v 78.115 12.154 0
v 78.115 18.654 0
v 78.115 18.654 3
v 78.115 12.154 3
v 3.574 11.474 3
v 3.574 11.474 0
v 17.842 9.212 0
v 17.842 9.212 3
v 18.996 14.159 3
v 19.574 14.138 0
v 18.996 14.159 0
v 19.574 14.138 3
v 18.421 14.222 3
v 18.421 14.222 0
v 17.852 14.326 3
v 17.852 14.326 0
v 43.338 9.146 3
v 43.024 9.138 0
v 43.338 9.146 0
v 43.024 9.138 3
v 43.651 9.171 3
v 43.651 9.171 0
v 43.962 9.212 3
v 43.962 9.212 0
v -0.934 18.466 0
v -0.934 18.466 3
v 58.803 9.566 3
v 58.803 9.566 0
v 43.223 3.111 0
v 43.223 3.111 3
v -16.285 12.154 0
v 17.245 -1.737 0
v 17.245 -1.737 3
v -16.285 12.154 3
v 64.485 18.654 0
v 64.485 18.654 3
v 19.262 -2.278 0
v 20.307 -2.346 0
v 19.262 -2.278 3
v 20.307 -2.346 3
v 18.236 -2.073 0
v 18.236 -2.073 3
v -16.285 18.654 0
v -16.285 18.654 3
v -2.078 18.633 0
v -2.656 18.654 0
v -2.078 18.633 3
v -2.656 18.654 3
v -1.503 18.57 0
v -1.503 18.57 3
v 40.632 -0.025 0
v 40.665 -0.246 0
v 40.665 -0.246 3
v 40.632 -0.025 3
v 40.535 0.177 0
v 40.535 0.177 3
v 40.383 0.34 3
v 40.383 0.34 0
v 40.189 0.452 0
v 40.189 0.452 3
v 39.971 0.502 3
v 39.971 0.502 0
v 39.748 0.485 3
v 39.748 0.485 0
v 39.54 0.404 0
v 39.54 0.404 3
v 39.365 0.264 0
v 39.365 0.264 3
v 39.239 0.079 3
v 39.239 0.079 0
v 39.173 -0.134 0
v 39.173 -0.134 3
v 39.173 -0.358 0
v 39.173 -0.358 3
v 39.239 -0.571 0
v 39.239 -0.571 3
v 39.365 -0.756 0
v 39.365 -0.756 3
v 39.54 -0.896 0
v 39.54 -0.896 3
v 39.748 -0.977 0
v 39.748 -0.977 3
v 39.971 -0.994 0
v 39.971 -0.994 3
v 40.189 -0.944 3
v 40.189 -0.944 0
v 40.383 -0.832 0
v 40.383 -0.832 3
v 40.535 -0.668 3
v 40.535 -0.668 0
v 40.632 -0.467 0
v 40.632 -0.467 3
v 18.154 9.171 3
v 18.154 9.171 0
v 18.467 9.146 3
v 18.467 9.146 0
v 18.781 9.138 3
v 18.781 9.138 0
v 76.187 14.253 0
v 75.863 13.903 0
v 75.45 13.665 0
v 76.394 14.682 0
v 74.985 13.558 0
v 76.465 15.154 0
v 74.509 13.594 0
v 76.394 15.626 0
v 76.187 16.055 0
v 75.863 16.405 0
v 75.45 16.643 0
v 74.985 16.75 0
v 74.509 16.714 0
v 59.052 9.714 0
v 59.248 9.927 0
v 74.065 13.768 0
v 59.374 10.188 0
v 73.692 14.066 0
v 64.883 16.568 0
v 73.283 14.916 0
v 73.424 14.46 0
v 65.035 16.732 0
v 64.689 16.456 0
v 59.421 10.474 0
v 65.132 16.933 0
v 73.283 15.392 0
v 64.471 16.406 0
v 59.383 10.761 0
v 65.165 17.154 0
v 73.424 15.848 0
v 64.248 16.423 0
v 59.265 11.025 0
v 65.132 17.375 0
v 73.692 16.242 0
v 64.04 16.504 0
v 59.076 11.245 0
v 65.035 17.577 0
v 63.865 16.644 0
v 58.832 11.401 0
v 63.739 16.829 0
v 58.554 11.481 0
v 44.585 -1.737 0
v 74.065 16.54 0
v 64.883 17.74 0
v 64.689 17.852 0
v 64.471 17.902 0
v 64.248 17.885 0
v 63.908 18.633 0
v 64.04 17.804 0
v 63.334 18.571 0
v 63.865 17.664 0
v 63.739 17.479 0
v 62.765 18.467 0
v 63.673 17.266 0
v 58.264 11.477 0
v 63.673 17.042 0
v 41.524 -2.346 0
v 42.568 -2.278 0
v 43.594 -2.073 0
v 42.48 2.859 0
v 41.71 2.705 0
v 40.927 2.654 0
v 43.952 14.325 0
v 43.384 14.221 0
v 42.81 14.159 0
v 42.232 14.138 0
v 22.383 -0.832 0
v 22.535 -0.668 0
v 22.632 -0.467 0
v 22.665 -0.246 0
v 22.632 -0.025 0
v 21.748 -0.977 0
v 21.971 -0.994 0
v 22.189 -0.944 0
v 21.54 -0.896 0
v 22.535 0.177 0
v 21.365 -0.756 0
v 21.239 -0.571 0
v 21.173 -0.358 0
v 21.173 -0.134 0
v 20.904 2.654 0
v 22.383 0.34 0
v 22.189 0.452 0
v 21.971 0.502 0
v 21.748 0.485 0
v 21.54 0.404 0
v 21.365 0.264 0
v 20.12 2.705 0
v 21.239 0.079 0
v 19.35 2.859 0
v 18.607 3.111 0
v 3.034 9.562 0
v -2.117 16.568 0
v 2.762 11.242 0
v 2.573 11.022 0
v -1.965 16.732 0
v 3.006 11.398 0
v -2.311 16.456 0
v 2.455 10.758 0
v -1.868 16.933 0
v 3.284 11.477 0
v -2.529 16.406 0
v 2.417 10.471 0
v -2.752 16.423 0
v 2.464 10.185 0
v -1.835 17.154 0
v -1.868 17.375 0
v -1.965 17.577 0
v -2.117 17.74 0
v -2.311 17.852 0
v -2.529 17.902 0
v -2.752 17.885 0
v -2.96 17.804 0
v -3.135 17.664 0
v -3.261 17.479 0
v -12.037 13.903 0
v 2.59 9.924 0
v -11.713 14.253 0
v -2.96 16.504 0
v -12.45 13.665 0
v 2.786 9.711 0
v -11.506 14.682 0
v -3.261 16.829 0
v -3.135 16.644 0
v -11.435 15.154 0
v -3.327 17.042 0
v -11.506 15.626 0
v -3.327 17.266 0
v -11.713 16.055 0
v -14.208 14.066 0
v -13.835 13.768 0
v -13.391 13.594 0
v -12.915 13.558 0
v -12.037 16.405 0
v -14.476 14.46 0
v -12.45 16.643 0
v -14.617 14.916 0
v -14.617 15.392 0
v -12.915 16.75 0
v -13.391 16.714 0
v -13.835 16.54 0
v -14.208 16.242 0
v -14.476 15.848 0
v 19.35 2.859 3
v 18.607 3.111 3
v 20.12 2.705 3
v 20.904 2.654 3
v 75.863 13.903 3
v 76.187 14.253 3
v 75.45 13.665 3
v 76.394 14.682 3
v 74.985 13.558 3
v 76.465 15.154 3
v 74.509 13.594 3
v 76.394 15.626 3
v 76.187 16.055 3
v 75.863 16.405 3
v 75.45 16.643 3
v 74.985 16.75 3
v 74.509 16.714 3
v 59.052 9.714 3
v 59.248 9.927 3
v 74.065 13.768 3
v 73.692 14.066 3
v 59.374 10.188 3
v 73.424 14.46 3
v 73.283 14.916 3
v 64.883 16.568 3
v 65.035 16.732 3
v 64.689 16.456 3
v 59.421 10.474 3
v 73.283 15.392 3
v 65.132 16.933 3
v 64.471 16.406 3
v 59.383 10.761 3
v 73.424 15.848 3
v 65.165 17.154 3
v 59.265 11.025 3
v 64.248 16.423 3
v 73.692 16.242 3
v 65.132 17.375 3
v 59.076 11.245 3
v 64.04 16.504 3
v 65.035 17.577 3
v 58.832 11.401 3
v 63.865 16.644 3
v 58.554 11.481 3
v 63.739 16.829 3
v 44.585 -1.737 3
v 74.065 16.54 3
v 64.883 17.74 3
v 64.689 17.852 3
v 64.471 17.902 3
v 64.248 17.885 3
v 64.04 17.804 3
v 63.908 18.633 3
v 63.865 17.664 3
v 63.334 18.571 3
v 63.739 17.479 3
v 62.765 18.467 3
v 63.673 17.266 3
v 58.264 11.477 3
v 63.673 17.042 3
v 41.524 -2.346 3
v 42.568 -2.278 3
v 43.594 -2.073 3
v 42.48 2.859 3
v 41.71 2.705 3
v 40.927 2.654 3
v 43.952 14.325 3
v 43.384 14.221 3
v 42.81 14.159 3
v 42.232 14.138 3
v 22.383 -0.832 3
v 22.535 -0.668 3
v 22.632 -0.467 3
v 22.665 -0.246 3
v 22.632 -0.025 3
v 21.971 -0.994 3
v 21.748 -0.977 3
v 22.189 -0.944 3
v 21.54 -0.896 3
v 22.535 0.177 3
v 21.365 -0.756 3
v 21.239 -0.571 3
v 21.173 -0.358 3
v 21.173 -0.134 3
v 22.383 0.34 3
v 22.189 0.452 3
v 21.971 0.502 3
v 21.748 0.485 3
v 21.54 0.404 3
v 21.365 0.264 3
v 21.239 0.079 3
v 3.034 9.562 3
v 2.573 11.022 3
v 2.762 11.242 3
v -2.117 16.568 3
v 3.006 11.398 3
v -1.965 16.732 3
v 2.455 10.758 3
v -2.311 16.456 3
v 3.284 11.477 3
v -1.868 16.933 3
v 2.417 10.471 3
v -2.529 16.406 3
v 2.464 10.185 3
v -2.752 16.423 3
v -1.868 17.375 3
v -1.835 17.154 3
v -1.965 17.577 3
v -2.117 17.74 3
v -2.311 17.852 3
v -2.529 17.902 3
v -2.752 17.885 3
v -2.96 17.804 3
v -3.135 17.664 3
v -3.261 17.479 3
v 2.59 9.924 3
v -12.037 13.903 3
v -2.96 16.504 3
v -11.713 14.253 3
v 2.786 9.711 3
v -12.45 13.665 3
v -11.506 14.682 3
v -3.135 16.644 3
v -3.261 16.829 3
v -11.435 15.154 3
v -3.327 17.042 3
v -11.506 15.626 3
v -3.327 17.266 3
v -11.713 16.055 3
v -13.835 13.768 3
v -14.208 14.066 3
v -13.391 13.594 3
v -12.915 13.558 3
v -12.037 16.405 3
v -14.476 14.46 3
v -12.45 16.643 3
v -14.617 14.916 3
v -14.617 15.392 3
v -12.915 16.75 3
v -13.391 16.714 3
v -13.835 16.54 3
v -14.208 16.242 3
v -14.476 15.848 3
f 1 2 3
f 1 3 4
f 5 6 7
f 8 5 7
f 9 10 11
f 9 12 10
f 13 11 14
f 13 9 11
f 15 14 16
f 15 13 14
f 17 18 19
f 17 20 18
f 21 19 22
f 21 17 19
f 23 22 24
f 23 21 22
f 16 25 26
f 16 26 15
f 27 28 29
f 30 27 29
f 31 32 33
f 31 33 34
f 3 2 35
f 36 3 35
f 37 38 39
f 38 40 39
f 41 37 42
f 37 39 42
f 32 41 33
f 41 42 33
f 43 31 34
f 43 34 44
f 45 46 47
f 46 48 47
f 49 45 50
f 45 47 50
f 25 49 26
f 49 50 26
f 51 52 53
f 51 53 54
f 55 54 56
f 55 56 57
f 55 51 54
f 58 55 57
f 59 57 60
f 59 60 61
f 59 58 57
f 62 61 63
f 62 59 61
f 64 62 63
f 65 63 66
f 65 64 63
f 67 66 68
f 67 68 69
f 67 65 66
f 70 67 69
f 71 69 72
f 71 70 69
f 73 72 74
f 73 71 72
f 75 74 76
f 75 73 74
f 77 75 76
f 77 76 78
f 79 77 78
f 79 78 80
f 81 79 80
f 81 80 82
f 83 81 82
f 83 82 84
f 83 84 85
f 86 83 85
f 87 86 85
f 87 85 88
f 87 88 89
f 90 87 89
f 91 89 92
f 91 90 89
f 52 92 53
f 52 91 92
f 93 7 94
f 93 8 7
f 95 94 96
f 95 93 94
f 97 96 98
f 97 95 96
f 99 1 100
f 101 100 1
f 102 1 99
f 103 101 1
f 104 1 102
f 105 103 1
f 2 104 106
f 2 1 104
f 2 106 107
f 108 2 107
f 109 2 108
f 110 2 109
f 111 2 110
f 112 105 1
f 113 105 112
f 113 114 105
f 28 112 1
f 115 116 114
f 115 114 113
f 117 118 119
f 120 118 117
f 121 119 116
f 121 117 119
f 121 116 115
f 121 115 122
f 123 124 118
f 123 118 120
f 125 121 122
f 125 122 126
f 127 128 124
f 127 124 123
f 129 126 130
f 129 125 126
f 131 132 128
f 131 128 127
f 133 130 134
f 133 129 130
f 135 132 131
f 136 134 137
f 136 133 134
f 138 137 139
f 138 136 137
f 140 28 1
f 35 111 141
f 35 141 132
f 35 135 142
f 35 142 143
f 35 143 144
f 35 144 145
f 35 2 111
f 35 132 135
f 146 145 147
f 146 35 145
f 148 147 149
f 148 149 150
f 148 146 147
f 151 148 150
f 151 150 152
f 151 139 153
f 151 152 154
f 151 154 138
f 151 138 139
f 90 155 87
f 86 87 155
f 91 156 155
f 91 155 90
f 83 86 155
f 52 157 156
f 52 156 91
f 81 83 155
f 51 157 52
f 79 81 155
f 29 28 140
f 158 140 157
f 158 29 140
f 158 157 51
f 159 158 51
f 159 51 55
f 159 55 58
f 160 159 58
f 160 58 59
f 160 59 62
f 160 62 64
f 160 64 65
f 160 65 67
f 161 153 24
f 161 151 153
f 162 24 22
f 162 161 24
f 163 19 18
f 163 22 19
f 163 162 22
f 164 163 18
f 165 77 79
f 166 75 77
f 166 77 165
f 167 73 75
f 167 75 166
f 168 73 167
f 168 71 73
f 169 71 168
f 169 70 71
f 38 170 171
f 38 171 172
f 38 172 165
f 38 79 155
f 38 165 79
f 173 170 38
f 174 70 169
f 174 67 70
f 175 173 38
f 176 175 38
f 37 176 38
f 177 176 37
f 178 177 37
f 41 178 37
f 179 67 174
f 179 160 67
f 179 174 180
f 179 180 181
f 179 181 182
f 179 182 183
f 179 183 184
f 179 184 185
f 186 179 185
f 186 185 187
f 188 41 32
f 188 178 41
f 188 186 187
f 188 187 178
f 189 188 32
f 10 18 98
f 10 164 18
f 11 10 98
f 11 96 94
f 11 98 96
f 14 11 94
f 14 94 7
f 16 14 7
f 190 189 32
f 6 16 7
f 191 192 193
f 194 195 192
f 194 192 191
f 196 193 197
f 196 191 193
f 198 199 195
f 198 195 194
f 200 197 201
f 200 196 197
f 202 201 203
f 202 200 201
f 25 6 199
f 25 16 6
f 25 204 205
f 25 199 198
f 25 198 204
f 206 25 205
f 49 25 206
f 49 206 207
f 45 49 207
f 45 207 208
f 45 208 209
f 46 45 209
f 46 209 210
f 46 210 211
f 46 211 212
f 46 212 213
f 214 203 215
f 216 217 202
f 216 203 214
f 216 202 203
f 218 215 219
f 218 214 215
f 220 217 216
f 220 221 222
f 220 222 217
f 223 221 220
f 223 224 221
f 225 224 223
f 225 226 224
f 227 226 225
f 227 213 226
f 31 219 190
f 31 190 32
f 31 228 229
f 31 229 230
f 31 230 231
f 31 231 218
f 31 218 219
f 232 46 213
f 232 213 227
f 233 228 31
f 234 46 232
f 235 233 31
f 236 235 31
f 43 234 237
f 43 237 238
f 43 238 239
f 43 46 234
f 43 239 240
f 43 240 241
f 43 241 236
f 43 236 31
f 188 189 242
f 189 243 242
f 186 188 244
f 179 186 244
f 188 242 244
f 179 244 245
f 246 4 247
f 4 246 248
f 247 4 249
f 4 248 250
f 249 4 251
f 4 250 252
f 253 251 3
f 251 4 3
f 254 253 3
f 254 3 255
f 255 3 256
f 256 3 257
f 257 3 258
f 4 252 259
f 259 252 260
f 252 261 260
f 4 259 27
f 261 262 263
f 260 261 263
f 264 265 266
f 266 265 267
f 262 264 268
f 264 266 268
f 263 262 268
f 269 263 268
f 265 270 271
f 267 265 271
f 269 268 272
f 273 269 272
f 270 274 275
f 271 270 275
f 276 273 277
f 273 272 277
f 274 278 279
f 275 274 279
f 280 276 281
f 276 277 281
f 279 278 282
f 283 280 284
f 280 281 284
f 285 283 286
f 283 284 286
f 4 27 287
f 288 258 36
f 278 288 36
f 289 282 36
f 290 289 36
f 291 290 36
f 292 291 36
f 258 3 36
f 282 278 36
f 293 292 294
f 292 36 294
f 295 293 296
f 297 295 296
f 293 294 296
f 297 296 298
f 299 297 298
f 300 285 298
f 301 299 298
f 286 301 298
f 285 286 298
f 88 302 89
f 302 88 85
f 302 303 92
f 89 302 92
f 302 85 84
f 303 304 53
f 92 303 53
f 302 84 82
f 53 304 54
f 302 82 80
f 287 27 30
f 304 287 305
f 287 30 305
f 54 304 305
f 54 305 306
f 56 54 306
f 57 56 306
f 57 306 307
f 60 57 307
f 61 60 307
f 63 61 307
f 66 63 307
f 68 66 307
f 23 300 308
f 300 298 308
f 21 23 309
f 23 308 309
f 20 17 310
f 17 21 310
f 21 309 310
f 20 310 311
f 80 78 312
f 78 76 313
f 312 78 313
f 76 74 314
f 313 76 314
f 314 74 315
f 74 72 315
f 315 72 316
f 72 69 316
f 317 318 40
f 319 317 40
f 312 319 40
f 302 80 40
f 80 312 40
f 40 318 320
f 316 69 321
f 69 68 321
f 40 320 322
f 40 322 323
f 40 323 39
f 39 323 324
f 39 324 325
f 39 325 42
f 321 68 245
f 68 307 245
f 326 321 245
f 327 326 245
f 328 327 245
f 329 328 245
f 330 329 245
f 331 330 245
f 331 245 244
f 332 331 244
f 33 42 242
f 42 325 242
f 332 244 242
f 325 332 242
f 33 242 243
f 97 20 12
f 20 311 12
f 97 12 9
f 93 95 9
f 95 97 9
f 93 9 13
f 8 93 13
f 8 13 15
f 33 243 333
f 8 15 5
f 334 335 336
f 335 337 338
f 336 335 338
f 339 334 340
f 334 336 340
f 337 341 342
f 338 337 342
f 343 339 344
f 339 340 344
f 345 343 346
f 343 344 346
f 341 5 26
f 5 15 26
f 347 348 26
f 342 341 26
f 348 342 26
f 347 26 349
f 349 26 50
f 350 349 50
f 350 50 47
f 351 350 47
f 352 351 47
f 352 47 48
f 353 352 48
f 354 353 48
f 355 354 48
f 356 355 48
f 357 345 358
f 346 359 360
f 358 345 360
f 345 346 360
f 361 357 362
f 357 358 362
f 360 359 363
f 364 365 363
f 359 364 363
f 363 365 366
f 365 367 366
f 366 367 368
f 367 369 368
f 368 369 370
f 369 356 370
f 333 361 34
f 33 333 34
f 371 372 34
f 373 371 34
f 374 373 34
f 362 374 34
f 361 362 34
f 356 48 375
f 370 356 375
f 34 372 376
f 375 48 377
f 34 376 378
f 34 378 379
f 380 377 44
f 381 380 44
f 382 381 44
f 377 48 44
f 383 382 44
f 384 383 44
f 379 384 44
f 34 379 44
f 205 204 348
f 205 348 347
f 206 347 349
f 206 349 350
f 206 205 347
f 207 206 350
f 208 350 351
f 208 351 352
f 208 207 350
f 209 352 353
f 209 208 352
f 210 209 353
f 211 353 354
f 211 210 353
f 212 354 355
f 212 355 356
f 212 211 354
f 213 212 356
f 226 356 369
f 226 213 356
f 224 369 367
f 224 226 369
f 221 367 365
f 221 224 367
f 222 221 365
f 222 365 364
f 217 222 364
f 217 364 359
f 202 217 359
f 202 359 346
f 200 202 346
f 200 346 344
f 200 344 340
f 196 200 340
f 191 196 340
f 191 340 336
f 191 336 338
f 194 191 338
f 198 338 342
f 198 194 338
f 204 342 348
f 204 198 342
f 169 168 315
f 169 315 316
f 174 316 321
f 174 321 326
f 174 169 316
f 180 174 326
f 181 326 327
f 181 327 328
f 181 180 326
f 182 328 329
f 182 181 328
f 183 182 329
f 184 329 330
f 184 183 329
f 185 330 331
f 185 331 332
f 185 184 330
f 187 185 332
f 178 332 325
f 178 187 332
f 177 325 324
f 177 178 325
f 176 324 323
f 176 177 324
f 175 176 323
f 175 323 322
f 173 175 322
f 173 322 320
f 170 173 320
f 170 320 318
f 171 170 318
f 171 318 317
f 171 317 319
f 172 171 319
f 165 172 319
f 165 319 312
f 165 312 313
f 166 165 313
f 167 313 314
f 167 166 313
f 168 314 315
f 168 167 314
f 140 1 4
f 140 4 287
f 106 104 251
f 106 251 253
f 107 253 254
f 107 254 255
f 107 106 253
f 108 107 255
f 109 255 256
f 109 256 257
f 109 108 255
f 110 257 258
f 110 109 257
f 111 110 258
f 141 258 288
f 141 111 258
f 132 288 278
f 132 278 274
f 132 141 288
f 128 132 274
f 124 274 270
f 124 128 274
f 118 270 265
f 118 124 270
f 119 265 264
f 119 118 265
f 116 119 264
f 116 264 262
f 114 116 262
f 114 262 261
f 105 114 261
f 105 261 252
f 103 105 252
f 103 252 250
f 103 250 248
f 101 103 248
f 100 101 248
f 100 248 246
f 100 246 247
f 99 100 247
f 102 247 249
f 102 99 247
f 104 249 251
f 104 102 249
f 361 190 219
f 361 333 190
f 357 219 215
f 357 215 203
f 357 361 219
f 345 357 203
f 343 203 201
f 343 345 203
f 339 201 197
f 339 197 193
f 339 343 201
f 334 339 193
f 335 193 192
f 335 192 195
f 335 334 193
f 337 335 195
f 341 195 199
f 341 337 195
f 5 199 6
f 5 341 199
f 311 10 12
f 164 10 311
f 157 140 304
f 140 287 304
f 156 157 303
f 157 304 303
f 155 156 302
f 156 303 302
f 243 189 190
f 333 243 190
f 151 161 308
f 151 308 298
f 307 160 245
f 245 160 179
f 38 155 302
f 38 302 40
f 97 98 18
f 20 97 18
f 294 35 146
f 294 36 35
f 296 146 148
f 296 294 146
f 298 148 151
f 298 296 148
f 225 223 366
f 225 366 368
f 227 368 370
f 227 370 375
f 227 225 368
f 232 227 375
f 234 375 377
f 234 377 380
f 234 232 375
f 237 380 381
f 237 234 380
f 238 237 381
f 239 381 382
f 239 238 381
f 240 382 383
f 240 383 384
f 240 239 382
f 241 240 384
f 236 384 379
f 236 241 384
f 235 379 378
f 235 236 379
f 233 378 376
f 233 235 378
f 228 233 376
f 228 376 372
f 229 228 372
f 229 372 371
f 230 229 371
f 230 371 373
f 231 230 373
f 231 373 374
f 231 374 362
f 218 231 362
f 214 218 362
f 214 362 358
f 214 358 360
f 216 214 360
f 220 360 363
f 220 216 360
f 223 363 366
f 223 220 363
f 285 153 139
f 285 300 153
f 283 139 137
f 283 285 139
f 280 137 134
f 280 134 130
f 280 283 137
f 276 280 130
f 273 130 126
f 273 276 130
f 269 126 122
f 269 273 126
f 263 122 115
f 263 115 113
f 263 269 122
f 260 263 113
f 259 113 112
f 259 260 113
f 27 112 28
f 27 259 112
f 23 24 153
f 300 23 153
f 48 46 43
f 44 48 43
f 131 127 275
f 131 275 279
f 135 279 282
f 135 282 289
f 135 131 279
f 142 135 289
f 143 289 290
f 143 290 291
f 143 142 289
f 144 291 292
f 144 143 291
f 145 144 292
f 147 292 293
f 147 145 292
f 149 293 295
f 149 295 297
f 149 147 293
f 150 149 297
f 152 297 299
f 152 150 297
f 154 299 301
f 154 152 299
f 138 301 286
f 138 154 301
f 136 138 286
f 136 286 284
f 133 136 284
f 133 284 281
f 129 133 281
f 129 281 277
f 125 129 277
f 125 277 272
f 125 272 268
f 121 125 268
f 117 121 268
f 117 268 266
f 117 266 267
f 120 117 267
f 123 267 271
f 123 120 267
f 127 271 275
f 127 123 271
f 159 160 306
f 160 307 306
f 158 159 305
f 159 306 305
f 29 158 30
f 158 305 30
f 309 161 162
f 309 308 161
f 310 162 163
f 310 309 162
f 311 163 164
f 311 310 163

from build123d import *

# Parameters (mm, degrees)
ESBO_O1_R                = 1.6
ESBO_O1_R_2              = 0.7499985
RESSALTO_EXTRUS_O1_DEPTH = 3
FILETE1_R                = 1
FILETE2_R                = 6
FILETE3_R                = 8
FILETE4_R                = 8


with BuildPart() as part:
    # Esboço1 → Ressalto-extrusão1 (new body)
    with BuildSketch(Plane.XY):
        Polygon((78.115114297, 18.654012354), (78.115114297, 12.154012354), (43.115114297, -2.345987646), (18.715114297, -2.345987646), (-16.284885703, 12.154012354), (-16.284885703, 18.654012354), (-9.784885703, 18.654012354), (-1.784885703, 18.654012354), (18.702505635, 14.138058789), (43.102505635, 14.138058789), (63.615114297, 18.654012354), (71.615114297, 18.654012354), align=None)
        with Locations((74.865114297, 15.154012354)):
            Circle(ESBO_O1_R, mode=Mode.SUBTRACT)
        with Locations((-13.034885703, 15.154012354)):
            Circle(ESBO_O1_R, mode=Mode.SUBTRACT)
        with Locations((21.915114517, -0.245988346)):
            Circle(ESBO_O1_R_2, mode=Mode.SUBTRACT)
        with Locations((39.915114077, -0.245988346)):
            Circle(ESBO_O1_R_2, mode=Mode.SUBTRACT)
        with Locations((64.415113337, 17.154012414)):
            Circle(ESBO_O1_R_2, mode=Mode.SUBTRACT)
        with Locations((-2.584884743, 17.154012414)):
            Circle(ESBO_O1_R_2, mode=Mode.SUBTRACT)
        Polygon((19.709836187, 2.654012354), (-4.773656813, 12.79717374), (18.308653057, 9.138058789), (43.496014169, 9.138058789), (66.607059688, 12.798488799), (42.120392408, 2.654012354), align=None, mode=Mode.SUBTRACT)
    extrude(amount=RESSALTO_EXTRUS_O1_DEPTH)

    # Filete1
    filete1_edges = [part.edges().sort_by_distance(p)[0] for p in [
        (66.607059688, 12.798488799, 1.5),
        (-4.773656813, 12.79717374, 1.5),
    ]]
    fillet(filete1_edges, radius=FILETE1_R)

    # Filete2
    filete2_edges = [part.edges().sort_by_distance(p)[0] for p in [
        (19.709836187, 2.654012354, 1.5),
        (42.120392408, 2.654012354, 1.5),
        (43.496014169, 9.138058789, 1.5),
        (18.308653057, 9.138058789, 1.5),
    ]]
    fillet(filete2_edges, radius=FILETE2_R)

    # Filete3
    filete3_edges = [part.edges().sort_by_distance(p)[0] for p in [
        (43.115114297, -2.345987646, 1.5),
        (18.715114297, -2.345987646, 1.5),
        (18.702505635, 14.138058789, 1.5),
        (43.102505635, 14.138058789, 1.5),
    ]]
    fillet(filete3_edges, radius=FILETE3_R)

    # Filete4
    filete4_edges = [part.edges().sort_by_distance(p)[0] for p in [
        (-1.784885703, 18.654012354, 1.5),
        (63.615114297, 18.654012354, 1.5),
    ]]
    fillet(filete4_edges, radius=FILETE4_R)


solid = part.part
